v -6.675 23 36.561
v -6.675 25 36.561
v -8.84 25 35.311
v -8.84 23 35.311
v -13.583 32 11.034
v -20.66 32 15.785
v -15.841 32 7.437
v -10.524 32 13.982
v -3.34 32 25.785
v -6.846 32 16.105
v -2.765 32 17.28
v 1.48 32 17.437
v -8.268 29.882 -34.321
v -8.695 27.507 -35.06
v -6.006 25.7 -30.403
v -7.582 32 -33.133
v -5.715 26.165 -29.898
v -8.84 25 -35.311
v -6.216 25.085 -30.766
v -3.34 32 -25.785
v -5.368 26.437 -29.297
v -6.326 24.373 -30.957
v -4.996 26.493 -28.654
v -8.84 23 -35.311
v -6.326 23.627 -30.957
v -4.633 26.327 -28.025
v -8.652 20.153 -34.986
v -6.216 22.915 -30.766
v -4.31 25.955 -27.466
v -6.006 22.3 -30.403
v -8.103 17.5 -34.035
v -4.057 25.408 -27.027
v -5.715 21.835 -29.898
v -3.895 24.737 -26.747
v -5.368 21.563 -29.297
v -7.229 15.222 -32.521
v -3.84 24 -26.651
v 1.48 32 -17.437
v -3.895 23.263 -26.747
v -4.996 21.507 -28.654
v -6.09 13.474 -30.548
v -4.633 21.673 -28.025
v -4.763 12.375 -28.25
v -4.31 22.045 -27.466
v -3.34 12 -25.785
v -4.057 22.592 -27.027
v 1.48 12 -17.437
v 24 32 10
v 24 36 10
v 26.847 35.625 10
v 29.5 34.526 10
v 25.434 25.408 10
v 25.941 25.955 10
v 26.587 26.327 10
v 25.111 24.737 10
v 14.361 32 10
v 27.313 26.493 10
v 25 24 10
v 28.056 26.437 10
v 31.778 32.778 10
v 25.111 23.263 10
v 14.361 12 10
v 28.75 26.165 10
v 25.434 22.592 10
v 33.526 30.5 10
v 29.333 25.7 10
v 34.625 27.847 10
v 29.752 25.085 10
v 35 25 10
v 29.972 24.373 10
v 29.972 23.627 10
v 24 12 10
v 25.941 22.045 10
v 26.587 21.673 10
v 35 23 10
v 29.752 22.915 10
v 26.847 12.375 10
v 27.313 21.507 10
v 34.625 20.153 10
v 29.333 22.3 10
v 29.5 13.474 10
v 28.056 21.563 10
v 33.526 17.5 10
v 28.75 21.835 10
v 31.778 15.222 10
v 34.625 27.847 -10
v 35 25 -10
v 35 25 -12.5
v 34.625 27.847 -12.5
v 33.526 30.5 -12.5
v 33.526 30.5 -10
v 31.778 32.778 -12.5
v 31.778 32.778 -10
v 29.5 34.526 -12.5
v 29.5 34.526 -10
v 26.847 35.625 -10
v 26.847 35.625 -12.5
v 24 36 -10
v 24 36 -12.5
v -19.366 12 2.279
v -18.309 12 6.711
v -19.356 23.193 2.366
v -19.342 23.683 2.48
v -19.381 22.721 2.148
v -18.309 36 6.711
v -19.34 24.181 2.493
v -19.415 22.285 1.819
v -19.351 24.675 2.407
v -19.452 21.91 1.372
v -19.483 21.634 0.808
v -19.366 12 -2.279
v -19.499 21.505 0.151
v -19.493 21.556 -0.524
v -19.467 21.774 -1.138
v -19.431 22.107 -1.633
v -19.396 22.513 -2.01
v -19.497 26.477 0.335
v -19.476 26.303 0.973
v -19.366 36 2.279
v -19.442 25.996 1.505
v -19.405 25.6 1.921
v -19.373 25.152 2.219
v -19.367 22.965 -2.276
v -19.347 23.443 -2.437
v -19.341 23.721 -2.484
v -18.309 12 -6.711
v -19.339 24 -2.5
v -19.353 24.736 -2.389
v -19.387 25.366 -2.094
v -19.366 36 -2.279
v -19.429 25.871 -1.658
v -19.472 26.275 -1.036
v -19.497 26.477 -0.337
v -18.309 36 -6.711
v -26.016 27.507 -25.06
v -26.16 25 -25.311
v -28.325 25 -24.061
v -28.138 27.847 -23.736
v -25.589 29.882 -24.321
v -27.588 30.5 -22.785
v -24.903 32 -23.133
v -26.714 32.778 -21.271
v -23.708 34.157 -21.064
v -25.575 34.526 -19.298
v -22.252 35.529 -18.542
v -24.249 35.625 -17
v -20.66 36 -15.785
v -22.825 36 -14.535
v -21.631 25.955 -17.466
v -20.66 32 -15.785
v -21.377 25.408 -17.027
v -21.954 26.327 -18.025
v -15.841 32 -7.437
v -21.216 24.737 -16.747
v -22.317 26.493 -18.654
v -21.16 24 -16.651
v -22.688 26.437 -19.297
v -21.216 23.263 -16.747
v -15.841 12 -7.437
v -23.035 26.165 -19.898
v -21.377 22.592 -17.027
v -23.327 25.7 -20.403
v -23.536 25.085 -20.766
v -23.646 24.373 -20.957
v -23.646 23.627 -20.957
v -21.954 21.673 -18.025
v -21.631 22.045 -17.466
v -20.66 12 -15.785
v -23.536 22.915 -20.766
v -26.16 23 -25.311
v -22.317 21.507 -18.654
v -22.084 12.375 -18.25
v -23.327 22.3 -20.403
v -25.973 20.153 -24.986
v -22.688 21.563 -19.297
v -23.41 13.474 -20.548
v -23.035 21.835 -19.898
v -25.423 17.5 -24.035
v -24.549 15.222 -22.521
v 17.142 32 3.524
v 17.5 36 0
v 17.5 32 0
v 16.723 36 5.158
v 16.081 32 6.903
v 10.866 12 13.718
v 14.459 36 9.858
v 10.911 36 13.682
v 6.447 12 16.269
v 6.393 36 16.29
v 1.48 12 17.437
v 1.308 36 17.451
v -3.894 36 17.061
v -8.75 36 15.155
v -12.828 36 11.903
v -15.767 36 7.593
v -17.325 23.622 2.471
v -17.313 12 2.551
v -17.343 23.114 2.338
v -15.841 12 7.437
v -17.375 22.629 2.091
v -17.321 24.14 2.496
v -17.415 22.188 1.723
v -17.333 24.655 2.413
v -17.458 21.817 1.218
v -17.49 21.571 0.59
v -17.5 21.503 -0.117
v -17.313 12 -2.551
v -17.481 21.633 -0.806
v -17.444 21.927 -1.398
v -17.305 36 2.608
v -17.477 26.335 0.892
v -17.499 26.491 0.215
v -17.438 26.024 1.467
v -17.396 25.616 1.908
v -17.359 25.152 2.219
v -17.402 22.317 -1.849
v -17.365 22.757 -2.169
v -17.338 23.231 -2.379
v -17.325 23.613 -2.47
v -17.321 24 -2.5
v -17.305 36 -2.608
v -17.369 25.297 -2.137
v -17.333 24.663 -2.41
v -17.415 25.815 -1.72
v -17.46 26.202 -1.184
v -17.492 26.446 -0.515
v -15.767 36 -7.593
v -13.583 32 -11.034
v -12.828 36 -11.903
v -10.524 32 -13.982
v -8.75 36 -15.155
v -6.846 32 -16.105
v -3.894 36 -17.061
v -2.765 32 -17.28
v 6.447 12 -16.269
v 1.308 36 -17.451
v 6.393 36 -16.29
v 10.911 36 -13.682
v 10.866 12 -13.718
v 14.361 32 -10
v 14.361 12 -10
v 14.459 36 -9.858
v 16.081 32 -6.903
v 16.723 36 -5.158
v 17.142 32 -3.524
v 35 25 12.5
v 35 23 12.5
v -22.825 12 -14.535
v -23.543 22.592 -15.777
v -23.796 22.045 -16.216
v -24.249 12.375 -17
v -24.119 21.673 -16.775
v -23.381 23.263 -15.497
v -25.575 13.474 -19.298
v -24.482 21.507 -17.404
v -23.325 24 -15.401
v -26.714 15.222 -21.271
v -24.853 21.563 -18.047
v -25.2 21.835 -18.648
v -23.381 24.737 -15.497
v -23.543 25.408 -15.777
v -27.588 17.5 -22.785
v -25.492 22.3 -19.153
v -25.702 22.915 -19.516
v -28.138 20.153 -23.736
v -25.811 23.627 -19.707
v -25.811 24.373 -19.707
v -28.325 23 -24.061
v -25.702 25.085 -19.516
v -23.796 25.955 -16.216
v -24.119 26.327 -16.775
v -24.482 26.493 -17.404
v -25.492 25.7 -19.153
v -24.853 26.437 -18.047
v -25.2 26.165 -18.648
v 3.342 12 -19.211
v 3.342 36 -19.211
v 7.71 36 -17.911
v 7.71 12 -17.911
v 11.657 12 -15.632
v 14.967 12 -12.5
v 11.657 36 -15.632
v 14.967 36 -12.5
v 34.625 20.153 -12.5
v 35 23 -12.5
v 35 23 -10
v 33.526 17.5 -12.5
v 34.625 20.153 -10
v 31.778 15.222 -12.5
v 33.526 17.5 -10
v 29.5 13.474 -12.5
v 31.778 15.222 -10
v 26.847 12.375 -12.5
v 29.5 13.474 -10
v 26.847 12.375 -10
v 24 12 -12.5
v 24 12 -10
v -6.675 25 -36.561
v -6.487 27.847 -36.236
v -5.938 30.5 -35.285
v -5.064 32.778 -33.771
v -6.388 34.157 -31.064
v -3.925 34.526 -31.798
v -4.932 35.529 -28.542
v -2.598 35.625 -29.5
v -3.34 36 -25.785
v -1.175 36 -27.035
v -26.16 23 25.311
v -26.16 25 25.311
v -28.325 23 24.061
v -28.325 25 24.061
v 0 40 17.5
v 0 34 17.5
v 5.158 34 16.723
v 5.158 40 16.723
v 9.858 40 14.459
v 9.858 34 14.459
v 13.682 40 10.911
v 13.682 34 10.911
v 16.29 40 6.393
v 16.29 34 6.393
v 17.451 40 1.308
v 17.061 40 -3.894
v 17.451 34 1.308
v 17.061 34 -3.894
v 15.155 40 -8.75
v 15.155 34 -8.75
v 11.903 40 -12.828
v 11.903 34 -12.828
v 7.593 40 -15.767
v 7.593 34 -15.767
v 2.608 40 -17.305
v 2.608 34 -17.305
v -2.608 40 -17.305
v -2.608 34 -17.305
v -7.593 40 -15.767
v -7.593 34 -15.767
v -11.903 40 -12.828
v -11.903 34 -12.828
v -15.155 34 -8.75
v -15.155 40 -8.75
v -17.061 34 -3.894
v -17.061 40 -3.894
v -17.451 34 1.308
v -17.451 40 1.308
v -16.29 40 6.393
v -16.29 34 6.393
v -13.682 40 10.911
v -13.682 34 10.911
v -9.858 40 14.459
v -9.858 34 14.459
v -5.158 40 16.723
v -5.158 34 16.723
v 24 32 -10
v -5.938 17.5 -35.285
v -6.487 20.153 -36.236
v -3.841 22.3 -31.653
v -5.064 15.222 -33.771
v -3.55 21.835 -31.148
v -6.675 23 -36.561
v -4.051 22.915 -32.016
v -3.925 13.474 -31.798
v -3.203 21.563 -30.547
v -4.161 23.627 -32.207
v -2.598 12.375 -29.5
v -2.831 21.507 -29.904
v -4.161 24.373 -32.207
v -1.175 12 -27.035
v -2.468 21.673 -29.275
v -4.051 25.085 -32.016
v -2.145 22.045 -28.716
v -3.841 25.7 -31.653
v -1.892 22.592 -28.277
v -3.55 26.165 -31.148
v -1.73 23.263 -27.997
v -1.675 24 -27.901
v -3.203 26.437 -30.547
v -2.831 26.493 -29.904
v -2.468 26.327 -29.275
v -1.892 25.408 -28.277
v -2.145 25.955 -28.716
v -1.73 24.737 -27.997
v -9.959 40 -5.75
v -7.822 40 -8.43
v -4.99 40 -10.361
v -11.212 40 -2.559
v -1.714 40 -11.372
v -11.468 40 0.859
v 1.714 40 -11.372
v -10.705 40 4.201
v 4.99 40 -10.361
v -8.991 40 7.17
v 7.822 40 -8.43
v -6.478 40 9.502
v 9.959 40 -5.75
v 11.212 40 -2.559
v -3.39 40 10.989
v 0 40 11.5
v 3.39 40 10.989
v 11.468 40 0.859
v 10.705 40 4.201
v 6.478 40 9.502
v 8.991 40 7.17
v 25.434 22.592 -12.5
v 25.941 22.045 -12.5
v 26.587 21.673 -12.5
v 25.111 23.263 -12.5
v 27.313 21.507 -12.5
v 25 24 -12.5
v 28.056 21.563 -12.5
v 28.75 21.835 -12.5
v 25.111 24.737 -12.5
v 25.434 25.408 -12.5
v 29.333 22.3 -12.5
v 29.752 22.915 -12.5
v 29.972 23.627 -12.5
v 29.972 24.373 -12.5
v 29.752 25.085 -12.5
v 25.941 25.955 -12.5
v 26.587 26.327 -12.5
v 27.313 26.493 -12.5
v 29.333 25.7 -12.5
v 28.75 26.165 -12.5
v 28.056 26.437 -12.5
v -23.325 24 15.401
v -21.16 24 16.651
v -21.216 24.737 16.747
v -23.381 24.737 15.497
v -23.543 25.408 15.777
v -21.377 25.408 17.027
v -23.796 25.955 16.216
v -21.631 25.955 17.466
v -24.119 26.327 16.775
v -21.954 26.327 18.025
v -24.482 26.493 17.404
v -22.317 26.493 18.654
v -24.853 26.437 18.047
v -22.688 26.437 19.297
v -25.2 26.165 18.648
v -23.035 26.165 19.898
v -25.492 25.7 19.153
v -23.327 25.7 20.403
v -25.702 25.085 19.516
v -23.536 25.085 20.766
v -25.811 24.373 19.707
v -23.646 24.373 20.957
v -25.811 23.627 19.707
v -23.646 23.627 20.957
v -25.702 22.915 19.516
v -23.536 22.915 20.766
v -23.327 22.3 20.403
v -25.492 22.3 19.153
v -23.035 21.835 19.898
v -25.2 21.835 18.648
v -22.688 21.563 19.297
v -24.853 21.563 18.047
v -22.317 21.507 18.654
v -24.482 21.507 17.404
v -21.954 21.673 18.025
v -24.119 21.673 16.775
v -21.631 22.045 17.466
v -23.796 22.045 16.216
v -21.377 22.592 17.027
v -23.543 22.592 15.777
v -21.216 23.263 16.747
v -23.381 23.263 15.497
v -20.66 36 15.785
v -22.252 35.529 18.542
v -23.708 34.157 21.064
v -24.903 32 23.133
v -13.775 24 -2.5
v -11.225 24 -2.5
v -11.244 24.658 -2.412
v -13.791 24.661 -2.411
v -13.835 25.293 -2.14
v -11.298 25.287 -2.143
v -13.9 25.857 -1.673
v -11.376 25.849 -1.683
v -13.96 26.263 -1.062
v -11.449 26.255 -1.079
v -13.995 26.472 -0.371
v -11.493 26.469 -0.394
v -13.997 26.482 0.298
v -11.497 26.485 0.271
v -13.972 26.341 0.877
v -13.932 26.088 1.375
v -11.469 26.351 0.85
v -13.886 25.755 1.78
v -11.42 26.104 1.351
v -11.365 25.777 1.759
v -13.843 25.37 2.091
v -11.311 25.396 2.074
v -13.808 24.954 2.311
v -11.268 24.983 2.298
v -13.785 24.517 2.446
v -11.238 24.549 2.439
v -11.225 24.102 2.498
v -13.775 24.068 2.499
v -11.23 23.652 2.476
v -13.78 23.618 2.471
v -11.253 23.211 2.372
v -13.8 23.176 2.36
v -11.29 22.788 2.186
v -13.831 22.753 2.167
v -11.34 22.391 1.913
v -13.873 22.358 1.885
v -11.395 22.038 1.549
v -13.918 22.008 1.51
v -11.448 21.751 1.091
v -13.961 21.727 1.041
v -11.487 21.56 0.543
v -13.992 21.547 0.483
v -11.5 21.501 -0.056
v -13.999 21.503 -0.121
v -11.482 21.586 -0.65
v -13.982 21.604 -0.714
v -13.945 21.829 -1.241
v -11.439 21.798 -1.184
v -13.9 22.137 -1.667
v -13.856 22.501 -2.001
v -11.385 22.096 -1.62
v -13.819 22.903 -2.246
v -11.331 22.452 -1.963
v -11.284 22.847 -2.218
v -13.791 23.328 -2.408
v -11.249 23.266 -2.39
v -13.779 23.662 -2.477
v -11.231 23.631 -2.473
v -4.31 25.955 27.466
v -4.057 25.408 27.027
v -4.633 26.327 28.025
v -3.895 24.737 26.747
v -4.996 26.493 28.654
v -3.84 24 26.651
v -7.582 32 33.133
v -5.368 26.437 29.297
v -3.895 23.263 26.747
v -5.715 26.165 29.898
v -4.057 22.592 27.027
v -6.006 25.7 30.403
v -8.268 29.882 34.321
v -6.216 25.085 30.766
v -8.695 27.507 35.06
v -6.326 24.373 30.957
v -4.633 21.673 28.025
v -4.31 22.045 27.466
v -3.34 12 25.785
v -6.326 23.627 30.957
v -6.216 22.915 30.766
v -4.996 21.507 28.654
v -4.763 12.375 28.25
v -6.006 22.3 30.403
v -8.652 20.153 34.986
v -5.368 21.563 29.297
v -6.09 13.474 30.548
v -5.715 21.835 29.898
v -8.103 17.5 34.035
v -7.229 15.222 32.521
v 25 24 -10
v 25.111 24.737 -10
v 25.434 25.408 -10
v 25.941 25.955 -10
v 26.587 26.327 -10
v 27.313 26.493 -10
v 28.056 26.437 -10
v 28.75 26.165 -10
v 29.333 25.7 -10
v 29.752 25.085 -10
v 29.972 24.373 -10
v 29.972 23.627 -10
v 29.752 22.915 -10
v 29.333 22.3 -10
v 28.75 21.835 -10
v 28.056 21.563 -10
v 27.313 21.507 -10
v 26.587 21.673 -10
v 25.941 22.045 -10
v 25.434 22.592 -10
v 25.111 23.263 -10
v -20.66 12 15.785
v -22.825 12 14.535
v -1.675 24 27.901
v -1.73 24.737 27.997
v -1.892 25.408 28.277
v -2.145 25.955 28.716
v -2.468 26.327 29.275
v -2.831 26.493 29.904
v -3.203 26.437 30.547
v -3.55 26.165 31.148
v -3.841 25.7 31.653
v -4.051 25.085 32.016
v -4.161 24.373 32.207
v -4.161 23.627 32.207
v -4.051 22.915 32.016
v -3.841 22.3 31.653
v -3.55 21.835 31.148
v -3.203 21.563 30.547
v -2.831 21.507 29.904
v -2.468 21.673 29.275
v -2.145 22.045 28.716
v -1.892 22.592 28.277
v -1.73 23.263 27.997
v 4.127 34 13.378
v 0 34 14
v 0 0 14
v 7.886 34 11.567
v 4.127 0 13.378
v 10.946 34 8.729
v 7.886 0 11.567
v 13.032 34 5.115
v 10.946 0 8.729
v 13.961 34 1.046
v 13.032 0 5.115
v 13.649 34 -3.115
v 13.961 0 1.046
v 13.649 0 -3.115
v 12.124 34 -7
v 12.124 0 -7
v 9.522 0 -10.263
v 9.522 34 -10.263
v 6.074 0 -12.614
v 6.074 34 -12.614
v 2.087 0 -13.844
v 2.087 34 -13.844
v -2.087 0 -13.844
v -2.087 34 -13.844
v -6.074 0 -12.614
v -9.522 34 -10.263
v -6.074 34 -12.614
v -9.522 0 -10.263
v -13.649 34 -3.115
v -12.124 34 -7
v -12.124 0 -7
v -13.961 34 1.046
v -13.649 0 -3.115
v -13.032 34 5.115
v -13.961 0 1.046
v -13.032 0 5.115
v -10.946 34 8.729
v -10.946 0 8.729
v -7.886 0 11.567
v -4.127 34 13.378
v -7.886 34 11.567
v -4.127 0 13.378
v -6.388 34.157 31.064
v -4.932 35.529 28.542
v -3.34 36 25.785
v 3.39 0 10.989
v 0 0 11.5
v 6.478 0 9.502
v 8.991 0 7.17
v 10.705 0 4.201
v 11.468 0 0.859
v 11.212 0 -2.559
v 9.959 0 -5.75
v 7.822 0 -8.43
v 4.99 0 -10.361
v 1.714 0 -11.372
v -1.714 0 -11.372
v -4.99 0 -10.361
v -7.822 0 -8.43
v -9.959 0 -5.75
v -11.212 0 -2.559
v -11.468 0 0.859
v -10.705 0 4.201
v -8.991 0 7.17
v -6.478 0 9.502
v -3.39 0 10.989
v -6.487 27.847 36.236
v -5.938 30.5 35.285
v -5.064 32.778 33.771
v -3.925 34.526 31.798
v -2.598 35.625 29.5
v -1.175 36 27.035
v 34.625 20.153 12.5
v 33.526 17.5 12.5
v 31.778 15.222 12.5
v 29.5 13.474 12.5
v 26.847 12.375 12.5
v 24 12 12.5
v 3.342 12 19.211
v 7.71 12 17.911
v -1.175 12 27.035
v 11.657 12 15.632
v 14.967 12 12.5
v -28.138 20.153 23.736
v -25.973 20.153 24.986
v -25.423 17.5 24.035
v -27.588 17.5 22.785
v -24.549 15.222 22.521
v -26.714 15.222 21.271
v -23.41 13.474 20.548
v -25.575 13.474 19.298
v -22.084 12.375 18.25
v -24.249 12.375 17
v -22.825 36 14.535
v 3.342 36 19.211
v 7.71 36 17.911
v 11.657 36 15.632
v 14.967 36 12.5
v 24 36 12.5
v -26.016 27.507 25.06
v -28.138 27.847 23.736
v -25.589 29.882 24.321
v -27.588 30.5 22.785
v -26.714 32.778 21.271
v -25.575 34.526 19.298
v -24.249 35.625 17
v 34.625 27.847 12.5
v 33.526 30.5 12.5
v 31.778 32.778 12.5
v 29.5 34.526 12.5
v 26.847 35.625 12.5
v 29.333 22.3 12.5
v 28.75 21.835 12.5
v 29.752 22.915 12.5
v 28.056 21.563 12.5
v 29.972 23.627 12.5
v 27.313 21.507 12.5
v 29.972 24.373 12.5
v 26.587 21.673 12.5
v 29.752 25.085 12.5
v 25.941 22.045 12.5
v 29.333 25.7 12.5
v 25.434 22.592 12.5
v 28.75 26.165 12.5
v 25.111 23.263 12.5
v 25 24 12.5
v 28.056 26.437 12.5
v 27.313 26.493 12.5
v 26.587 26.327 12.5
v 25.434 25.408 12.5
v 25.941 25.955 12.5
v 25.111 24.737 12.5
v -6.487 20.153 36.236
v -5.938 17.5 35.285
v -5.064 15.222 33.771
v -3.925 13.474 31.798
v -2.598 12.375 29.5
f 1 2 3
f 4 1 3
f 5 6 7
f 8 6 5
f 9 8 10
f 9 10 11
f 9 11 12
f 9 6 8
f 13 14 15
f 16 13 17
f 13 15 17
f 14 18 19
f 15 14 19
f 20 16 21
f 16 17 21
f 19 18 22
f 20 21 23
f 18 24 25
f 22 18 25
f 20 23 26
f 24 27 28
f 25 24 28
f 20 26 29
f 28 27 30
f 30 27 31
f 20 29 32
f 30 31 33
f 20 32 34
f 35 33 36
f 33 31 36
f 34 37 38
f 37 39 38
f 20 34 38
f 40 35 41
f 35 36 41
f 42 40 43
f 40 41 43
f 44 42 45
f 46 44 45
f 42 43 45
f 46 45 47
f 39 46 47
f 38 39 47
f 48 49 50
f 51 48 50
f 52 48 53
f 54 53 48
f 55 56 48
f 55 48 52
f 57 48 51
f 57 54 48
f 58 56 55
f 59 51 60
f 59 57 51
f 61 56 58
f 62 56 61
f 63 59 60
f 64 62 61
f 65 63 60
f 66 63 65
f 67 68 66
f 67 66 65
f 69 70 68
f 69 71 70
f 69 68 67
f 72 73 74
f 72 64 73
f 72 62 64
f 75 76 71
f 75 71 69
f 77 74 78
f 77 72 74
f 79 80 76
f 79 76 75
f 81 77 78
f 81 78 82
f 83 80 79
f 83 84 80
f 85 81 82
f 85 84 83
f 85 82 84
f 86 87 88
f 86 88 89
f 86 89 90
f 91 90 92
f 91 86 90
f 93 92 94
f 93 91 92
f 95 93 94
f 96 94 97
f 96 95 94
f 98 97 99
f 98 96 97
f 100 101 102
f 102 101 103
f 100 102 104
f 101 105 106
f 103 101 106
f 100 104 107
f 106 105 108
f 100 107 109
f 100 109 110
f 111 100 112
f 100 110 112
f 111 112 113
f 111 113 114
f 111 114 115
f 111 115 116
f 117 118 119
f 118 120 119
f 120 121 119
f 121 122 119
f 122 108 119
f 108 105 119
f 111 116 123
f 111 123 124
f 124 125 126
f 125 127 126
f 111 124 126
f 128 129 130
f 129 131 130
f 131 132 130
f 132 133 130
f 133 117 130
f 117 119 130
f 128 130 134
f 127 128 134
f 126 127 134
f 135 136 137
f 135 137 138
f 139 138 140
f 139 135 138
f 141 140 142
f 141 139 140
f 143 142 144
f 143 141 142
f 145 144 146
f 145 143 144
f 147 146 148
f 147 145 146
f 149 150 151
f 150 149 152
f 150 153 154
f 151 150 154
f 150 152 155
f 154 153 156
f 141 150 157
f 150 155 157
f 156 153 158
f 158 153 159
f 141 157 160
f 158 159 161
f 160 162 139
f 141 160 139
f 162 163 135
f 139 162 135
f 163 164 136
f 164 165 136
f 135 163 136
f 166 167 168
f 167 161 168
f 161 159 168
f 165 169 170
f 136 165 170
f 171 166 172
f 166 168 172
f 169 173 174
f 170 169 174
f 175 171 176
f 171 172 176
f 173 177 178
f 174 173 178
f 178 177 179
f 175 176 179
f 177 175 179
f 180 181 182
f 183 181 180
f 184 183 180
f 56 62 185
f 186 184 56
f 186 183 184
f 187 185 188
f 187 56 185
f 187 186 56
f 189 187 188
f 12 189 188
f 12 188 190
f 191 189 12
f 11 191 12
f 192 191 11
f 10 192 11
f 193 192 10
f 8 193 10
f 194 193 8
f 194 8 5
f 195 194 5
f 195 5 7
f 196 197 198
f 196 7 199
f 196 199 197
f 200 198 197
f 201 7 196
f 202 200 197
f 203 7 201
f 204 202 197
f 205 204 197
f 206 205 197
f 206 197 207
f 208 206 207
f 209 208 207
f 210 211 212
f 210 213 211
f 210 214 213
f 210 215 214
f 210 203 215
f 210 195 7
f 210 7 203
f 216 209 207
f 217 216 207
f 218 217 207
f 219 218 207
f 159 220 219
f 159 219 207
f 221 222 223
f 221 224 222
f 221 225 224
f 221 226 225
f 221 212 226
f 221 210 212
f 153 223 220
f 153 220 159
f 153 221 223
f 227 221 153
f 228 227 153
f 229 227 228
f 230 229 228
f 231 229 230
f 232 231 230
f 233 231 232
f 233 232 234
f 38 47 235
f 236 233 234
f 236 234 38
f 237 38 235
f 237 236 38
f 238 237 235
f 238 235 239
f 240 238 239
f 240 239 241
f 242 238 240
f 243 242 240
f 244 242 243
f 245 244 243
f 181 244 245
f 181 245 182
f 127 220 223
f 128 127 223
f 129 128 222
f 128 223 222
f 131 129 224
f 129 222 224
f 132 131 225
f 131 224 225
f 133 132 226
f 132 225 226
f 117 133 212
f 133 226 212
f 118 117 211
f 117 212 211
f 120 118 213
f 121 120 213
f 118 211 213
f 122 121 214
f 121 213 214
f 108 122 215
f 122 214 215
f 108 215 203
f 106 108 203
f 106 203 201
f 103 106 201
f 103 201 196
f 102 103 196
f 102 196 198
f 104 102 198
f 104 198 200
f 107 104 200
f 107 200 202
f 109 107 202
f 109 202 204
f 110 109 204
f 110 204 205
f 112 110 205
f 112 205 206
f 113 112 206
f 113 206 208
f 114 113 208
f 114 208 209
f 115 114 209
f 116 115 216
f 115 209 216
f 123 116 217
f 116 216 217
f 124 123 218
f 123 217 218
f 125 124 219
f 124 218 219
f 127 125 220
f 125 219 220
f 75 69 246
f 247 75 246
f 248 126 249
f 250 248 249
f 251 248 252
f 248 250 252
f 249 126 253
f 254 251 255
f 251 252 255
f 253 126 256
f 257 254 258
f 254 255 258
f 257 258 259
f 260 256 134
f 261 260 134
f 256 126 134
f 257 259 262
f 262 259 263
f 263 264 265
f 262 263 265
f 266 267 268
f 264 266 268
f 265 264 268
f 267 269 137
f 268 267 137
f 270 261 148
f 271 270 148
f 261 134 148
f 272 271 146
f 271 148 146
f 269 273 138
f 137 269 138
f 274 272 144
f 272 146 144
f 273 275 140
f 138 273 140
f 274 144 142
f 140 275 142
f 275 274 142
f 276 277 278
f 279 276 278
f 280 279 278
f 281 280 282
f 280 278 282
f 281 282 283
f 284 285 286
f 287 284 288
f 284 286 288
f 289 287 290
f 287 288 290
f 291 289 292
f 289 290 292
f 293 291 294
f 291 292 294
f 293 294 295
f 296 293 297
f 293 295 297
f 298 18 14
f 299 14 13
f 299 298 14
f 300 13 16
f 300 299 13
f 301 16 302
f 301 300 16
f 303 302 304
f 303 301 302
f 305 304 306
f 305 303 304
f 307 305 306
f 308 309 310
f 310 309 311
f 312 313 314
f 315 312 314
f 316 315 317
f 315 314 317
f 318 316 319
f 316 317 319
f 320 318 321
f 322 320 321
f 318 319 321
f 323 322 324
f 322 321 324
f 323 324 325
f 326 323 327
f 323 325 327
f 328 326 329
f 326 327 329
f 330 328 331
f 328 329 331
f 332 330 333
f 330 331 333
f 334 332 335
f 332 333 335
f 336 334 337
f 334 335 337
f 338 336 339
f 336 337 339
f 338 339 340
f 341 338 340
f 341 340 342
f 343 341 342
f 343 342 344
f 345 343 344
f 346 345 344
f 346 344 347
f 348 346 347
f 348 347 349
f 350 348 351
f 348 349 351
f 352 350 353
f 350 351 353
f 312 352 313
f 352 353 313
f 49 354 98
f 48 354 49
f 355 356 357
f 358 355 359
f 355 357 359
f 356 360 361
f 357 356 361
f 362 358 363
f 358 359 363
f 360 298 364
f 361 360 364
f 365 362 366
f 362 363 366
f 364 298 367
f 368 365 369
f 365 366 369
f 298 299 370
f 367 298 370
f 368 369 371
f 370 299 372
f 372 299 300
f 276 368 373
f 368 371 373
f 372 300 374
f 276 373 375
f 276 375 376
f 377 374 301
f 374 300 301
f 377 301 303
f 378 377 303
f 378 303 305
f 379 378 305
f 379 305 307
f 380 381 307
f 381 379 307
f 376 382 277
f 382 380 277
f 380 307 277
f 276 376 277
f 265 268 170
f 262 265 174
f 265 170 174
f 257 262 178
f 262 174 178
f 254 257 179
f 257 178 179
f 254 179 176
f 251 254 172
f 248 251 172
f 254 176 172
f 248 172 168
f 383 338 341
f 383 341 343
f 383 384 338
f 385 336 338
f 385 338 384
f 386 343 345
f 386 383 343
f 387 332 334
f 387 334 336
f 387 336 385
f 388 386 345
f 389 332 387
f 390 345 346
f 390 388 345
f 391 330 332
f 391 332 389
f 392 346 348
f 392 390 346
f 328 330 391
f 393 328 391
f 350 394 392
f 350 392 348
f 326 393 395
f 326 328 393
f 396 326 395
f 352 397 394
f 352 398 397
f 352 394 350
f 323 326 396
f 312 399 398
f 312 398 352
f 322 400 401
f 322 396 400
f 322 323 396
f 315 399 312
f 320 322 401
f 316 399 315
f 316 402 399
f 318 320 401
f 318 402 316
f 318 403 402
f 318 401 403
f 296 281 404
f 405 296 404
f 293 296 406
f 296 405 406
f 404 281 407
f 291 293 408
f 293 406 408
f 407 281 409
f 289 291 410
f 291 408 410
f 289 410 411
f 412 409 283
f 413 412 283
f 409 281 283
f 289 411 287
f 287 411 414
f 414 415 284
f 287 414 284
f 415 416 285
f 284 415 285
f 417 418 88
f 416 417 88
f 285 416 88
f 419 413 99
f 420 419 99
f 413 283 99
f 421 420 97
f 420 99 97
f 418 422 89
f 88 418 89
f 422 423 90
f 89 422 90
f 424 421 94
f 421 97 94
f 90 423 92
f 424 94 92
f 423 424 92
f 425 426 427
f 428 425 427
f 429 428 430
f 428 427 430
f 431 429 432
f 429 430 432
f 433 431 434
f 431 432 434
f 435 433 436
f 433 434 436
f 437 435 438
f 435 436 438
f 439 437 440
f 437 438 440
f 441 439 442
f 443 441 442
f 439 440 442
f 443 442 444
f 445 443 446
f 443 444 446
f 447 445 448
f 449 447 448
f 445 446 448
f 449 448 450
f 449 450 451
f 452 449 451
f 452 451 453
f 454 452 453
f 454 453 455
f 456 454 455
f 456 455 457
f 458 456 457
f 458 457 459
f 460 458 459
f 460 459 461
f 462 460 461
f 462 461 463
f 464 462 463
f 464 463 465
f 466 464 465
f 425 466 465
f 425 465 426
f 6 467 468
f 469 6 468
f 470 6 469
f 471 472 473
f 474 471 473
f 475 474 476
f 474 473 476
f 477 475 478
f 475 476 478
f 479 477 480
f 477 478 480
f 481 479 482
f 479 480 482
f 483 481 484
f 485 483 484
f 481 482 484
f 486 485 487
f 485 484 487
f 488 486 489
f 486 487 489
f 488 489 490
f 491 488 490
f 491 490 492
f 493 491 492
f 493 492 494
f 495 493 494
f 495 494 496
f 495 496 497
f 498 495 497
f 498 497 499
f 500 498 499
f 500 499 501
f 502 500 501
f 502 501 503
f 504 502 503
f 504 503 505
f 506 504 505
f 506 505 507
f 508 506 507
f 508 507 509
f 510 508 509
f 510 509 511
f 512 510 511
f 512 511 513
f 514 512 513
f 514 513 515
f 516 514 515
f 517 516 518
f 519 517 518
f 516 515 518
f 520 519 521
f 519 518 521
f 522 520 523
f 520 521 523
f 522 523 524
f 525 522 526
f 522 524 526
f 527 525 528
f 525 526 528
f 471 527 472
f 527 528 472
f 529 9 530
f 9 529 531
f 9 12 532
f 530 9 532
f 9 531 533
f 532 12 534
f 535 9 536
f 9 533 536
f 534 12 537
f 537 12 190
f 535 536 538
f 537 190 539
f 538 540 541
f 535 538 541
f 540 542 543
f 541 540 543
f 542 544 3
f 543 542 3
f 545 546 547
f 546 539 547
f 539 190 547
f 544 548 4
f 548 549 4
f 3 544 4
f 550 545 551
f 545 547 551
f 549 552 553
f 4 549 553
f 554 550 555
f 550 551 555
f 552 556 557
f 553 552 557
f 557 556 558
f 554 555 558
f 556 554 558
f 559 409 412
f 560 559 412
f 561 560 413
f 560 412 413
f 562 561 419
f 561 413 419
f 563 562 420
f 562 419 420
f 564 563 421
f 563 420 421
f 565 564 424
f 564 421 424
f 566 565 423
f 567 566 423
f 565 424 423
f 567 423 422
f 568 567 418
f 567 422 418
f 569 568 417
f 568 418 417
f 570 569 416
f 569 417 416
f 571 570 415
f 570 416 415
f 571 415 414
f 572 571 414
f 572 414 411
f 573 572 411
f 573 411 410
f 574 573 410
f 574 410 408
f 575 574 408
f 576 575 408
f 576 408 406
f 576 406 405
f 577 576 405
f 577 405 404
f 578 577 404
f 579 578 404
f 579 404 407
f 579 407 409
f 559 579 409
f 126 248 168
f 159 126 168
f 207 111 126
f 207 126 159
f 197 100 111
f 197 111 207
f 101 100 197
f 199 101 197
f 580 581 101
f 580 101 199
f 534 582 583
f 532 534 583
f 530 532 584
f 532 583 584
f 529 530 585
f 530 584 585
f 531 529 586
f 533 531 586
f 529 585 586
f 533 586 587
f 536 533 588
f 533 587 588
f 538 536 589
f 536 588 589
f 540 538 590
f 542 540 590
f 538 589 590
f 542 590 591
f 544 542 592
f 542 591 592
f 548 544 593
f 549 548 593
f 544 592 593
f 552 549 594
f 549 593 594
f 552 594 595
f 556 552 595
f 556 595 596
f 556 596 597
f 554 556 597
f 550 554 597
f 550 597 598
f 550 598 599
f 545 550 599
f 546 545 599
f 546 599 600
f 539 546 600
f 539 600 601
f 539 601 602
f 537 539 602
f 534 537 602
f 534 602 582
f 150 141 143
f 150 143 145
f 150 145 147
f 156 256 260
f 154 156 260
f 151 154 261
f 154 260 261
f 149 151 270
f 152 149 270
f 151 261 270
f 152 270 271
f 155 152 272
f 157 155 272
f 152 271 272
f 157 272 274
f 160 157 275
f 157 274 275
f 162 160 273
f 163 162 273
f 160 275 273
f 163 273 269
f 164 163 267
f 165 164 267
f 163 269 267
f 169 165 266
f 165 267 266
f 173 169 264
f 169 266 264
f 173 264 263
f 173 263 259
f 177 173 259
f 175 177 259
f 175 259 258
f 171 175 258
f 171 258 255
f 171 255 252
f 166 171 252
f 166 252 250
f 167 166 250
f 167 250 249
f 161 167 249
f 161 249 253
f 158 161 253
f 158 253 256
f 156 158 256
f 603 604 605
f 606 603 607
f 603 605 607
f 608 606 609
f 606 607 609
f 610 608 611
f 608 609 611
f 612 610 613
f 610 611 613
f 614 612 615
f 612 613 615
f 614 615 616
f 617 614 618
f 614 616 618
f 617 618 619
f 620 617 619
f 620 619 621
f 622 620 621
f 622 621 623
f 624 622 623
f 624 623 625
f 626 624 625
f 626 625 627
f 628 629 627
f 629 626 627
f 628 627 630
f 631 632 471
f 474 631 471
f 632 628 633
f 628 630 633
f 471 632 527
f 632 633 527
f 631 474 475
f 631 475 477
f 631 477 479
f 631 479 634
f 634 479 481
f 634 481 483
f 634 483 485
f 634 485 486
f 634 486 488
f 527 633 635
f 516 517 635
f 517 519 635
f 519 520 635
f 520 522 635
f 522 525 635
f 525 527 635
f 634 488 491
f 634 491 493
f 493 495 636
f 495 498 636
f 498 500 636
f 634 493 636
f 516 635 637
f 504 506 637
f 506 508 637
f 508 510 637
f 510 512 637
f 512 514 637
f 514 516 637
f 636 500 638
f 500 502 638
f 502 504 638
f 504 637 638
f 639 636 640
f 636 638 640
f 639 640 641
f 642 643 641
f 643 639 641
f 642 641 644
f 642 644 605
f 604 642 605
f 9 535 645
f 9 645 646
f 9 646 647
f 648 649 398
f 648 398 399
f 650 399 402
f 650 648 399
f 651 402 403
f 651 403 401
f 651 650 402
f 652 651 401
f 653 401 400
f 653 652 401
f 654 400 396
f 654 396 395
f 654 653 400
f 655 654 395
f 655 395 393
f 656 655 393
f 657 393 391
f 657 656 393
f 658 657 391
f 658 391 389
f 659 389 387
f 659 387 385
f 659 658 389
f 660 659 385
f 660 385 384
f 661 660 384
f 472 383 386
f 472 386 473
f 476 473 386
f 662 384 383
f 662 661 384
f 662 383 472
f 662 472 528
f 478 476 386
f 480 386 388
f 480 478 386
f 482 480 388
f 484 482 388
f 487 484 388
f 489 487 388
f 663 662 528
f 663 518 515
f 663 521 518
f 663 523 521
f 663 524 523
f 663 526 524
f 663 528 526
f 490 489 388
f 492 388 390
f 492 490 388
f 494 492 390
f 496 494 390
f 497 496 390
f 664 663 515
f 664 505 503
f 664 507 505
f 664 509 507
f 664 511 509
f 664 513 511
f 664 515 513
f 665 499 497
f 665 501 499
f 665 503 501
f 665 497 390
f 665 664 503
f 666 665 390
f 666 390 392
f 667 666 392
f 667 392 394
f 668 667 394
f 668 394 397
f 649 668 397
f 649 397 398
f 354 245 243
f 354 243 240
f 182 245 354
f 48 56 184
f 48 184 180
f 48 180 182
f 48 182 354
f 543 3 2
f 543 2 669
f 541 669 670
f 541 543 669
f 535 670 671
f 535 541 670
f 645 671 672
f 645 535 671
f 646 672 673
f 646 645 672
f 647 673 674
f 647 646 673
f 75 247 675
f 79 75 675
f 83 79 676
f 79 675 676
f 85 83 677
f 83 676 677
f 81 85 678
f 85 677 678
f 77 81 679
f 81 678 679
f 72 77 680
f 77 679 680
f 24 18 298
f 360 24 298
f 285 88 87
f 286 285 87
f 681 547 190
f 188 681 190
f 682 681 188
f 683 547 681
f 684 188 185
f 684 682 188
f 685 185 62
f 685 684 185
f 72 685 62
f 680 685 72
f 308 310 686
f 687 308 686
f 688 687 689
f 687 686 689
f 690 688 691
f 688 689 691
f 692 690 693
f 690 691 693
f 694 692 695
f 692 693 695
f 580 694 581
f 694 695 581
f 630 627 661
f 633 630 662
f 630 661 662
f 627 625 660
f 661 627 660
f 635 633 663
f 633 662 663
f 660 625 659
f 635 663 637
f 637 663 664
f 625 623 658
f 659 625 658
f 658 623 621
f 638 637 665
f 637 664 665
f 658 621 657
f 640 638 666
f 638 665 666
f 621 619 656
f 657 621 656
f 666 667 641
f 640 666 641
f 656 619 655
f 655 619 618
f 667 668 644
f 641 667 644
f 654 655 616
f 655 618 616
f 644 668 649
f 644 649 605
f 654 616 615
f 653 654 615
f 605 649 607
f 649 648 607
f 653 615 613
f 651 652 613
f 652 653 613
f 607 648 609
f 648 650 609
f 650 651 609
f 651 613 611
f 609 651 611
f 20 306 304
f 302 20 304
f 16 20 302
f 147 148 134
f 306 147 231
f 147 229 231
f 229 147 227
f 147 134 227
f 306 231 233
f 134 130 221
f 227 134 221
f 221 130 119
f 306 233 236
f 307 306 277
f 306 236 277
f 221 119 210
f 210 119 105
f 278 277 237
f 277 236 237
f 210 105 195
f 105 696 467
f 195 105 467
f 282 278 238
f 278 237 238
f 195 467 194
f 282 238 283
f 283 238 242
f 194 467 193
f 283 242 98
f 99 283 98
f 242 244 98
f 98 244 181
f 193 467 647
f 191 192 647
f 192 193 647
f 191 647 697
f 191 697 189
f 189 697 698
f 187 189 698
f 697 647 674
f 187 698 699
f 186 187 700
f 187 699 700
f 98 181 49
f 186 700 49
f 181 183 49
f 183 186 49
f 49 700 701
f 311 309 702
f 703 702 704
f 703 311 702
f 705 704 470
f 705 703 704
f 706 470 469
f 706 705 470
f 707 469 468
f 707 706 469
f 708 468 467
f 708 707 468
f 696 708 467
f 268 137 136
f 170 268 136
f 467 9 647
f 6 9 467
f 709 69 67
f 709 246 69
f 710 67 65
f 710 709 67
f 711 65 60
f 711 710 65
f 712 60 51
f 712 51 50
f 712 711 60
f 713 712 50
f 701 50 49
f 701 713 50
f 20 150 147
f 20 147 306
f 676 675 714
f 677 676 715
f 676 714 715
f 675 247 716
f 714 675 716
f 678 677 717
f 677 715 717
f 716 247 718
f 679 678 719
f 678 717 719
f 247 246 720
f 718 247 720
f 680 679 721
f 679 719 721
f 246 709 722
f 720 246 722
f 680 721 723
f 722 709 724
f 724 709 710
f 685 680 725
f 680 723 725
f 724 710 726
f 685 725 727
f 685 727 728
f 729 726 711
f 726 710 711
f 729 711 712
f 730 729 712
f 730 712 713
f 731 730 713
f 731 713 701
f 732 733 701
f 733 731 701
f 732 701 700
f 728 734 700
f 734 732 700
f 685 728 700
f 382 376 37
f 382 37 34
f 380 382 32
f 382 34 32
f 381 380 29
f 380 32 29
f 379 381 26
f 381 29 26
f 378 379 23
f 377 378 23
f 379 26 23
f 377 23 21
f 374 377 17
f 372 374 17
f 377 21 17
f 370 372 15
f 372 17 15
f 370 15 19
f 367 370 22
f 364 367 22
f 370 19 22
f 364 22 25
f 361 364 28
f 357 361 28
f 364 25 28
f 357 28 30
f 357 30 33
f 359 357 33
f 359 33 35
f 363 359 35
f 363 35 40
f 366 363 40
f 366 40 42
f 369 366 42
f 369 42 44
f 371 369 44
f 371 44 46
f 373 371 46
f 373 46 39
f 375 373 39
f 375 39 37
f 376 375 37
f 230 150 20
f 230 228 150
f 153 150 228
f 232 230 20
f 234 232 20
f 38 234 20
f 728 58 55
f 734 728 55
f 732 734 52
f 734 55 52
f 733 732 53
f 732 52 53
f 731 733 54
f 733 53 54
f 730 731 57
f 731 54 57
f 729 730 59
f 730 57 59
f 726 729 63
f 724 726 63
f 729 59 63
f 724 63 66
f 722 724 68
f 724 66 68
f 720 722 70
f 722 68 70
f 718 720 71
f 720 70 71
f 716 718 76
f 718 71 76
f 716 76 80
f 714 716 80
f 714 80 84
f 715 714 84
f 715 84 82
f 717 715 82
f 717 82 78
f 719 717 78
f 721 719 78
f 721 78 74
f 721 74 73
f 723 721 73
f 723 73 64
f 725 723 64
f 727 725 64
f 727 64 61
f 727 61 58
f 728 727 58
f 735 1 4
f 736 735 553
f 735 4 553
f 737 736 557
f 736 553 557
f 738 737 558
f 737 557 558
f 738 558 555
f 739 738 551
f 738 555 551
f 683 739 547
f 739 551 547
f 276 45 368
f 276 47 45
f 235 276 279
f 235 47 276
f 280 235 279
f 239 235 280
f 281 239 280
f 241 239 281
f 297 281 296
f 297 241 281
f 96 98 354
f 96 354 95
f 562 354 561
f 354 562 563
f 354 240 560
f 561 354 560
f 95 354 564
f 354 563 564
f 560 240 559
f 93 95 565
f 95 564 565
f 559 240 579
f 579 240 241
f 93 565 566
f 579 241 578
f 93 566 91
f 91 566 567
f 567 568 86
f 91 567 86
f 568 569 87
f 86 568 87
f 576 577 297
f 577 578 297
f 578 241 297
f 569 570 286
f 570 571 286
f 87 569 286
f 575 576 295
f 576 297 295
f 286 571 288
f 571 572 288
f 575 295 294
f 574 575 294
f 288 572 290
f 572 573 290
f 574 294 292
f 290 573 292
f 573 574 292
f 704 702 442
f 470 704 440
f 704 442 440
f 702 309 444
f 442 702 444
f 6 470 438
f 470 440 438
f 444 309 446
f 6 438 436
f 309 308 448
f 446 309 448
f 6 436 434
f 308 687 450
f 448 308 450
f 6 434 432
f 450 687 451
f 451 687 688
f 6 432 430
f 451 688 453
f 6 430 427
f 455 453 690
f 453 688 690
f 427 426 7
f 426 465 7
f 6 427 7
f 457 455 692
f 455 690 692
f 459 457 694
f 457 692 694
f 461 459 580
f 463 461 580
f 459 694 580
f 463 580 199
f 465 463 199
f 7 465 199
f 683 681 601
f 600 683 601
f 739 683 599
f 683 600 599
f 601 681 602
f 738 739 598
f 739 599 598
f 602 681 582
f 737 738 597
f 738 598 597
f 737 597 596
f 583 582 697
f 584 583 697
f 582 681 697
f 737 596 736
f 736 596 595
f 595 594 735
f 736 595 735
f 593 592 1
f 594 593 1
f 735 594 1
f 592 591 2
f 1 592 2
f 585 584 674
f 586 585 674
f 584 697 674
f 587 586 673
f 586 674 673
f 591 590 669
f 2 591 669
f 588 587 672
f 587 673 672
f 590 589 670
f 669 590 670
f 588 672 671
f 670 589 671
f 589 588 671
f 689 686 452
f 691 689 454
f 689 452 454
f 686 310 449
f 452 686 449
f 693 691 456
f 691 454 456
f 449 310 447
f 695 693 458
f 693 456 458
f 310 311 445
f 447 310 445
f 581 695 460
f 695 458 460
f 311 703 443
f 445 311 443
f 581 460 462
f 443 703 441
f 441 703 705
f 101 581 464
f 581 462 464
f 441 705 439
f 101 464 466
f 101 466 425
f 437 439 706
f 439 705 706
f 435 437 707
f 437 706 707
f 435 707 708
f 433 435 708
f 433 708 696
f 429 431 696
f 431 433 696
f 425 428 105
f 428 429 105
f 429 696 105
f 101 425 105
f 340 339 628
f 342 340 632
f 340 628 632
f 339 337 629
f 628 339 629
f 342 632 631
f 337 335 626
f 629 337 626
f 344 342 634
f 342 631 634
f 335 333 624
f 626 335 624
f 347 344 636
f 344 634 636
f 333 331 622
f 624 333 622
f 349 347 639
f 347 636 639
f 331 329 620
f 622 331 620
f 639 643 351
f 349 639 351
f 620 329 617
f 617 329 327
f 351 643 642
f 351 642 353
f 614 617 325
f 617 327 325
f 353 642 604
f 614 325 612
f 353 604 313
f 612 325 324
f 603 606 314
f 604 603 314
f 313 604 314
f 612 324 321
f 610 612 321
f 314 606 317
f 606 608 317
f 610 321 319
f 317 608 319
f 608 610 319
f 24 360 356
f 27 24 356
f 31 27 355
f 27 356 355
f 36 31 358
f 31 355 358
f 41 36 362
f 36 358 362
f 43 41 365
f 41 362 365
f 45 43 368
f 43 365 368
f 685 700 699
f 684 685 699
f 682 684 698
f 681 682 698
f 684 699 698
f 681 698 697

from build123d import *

# Parameters (mm, degrees)
SKETCH1_R               = 14
SKETCH1_R_2             = 11.5
BOSS_EXTRUDE1_DEPTH     = 40
BOSS_EXTRUDE2_START     = -6
SKETCH2_R               = 17.5
SKETCH2_R_2             = 11.5
BOSS_EXTRUDE2_DEPTH     = 6
BOSS_EXTRUDE3_START     = -2
BOSS_EXTRUDE3_OUTLINE_R = 17.5
BOSS_EXTRUDE3_DEPTH     = 24
FILLET1_R               = 11
CUT_EXTRUDE1_DEPTH      = 20
SKETCH5_W               = 11
SKETCH5_H               = 20
CUT_EXTRUDE2_DEPTH      = 20
SKETCH7_R               = 2.5
CUT_EXTRUDE3_DEPTH      = 71.466619449
SKETCH9_R               = 2.5
CUT_EXTRUDE4_DEPTH      = 75.382336321
SKETCH10_R              = 2.5
CUT_EXTRUDE5_DEPTH      = 73.332363728
SKETCH11_R              = 2.5
CUT_EXTRUDE6_DEPTH      = 65.51122859


# Read off the part's stored shape, not the designer's step: Boss-Extrude3
with BuildPart() as part:
    # Sketch1 → Boss-Extrude1 (new body)
    with BuildSketch(Plane(origin=(0, 0, 0), x_dir=(1, 0, 0), z_dir=(0, 1, 0))):
        with Locations(Location((0, 0, 0), (0, 0, 270))):
            Circle(SKETCH1_R)
        with Locations(Location((0, 0, 0), (0, 0, 270))):
            Circle(SKETCH1_R_2, mode=Mode.SUBTRACT)
    extrude(amount=BOSS_EXTRUDE1_DEPTH)

    # Sketch2 → Boss-Extrude2 (add)
    with BuildSketch(Plane(origin=(0, 40, 0), x_dir=(1, 0, 0), z_dir=(0, 1, 0)).offset(BOSS_EXTRUDE2_START)):
        with Locations(Location((0, 0, 0), (0, 0, 270))):
            Circle(SKETCH2_R)
        with Locations(Location((0, 0, 0), (0, 0, 270))):
            Circle(SKETCH2_R_2, mode=Mode.SUBTRACT)
    extrude(amount=BOSS_EXTRUDE2_DEPTH)


with BuildPart() as body_2:
    # Boss-Extrude3 outline → Boss-Extrude3 (new body)
    with BuildSketch(Plane.XZ.offset(-34).offset(BOSS_EXTRUDE3_START)):
        with BuildLine():
            Line((-6.674682453, -36.560889132), (3.342002774, -19.211481397))
            ThreePointArc((3.342002774, -19.211481397), (9.75, -16.887495374), (14.966629547, -12.5))
            Line((14.966629547, -12.5), (35, -12.5))
            Line((35, -12.5), (35, 12.5))
            Line((35, 12.5), (14.966629547, 12.5))
            ThreePointArc((14.966629547, 12.5), (9.75, 16.887495374), (3.342002774, 19.211481397))
            Line((3.342002774, 19.211481397), (-6.674682453, 36.560889132))
            Line((-6.674682453, 36.560889132), (-28.325317547, 24.060889132))
            Line((-28.325317547, 24.060889132), (-18.308632321, 6.711481397))
            ThreePointArc((-18.308632321, 6.711481397), (-19.5, 0), (-18.308632321, -6.711481397))
            Line((-18.308632321, -6.711481397), (-28.325317547, -24.060889132))
            Line((-28.325317547, -24.060889132), (-6.674682453, -36.560889132))
        make_face()
        Circle(BOSS_EXTRUDE3_OUTLINE_R, mode=Mode.SUBTRACT)
    extrude(amount=BOSS_EXTRUDE3_DEPTH)

    # Fillet1
    fillet1_edges = [body_2.edges().sort_by_distance(p)[0] for p in [
        (35, 36, 0),
        (35, 12, 0),
        (-17.5, 12, 30.310889132),
        (-17.5, 36, 30.310889132),
        (-17.5, 12, -30.310889132),
        (-17.5, 36, -30.310889132),
    ]]
    fillet(fillet1_edges, radius=FILLET1_R)

    # Sketch4 → Cut-Extrude1 (cut)
    with BuildSketch(Plane.XZ.offset(-12)):
        with BuildLine():
            Line((36.429567038, 10), (14.361406616, 10))
            ThreePointArc((14.361406616, 10), (17.5, 0), (14.361406616, -10))
            Line((14.361406616, -10), (36.429567038, -10))
            Line((36.429567038, -10), (36.429567038, 10))
        make_face()
        with BuildLine():
            Line((-9.554529481, -36.548930504), (1.47955073, -17.437342964))
            ThreePointArc((1.47955073, -17.437342964), (-8.75, -15.155444566), (-15.840957346, -7.437342964))
            Line((-15.840957346, -7.437342964), (-26.875037557, -26.548930504))
            Line((-26.875037557, -26.548930504), (-9.554529481, -36.548930504))
        make_face()
        with BuildLine():
            Line((-26.875037557, 26.548930504), (-15.840957346, 7.437342964))
            ThreePointArc((-15.840957346, 7.437342964), (-8.75, 15.155444566), (1.47955073, 17.437342964))
            Line((1.47955073, 17.437342964), (-9.554529481, 36.548930504))
            Line((-9.554529481, 36.548930504), (-26.875037557, 26.548930504))
        make_face()
    extrude(amount=-CUT_EXTRUDE1_DEPTH, mode=Mode.SUBTRACT)

    # Sketch5 → Cut-Extrude2 (cut)
    with BuildSketch(Plane.XZ.offset(-32)):
        with Locations((29.5, 0)):
            Rectangle(SKETCH5_W, SKETCH5_H)
        Polygon((-3.339745962, -25.784609691), (-8.839745962, -35.310889132), (-26.160254038, -25.310889132), (-20.660254038, -15.784609691), align=None)
        Polygon((-20.660254038, 15.784609691), (-26.160254038, 25.310889132), (-8.839745962, 35.310889132), (-3.339745962, 25.784609691), align=None)
    extrude(amount=-CUT_EXTRUDE2_DEPTH, mode=Mode.SUBTRACT)

    # Sketch7 → Cut-Extrude3 (cut, through all)
    with BuildSketch(Plane(origin=(10.825317547, 0, 6.25), x_dir=(0.5000000000000043, 0, -0.8660254037844363), z_dir=(0.8660254037844363, 0, 0.5000000000000043))):
        with Locations((-27.5, 24)):
            Circle(SKETCH7_R)
    extrude(amount=-CUT_EXTRUDE3_DEPTH, mode=Mode.SUBTRACT)

    # Sketch9 → Cut-Extrude4 (cut, through all)
    with BuildSketch(Plane(origin=(-10.825317547, 0, 6.25), x_dir=(0.49999999999999195, 0, 0.8660254037844433), z_dir=(-0.8660254037844433, 0, 0.49999999999999195))):
        with Locations((-27.5, 24)):
            Circle(SKETCH9_R)
    extrude(amount=-CUT_EXTRUDE4_DEPTH, mode=Mode.SUBTRACT)

    # Sketch10 → Cut-Extrude5 (cut, through all)
    with BuildSketch(Plane(origin=(0, 0, -12.5), x_dir=(-1, 0, 0), z_dir=(0, 0, -1))):
        with Locations((-27.5, 24)):
            Circle(SKETCH10_R)
    extrude(amount=-CUT_EXTRUDE5_DEPTH, mode=Mode.SUBTRACT)


with BuildPart() as cut_extrude6_tool:
    # Sketch11 → Cut-Extrude6 (new, through all)
    with BuildSketch(Plane(origin=(0, 0, 0), x_dir=(0, 0, -1), z_dir=(1, 0, 0))):
        with Locations((0, 24)):
            Circle(SKETCH11_R)
    extrude(amount=-CUT_EXTRUDE6_DEPTH)


with BuildPart() as part_1:
    add(part.part)

    # Cut-Extrude6: cut by cut_extrude6_tool
    add(cut_extrude6_tool.part, mode=Mode.SUBTRACT)


with BuildPart() as body_2_1:
    add(body_2.part)

    # Cut-Extrude6: cut by cut_extrude6_tool
    add(cut_extrude6_tool.part, mode=Mode.SUBTRACT)


solid = Compound([part_1.part, body_2_1.part])
